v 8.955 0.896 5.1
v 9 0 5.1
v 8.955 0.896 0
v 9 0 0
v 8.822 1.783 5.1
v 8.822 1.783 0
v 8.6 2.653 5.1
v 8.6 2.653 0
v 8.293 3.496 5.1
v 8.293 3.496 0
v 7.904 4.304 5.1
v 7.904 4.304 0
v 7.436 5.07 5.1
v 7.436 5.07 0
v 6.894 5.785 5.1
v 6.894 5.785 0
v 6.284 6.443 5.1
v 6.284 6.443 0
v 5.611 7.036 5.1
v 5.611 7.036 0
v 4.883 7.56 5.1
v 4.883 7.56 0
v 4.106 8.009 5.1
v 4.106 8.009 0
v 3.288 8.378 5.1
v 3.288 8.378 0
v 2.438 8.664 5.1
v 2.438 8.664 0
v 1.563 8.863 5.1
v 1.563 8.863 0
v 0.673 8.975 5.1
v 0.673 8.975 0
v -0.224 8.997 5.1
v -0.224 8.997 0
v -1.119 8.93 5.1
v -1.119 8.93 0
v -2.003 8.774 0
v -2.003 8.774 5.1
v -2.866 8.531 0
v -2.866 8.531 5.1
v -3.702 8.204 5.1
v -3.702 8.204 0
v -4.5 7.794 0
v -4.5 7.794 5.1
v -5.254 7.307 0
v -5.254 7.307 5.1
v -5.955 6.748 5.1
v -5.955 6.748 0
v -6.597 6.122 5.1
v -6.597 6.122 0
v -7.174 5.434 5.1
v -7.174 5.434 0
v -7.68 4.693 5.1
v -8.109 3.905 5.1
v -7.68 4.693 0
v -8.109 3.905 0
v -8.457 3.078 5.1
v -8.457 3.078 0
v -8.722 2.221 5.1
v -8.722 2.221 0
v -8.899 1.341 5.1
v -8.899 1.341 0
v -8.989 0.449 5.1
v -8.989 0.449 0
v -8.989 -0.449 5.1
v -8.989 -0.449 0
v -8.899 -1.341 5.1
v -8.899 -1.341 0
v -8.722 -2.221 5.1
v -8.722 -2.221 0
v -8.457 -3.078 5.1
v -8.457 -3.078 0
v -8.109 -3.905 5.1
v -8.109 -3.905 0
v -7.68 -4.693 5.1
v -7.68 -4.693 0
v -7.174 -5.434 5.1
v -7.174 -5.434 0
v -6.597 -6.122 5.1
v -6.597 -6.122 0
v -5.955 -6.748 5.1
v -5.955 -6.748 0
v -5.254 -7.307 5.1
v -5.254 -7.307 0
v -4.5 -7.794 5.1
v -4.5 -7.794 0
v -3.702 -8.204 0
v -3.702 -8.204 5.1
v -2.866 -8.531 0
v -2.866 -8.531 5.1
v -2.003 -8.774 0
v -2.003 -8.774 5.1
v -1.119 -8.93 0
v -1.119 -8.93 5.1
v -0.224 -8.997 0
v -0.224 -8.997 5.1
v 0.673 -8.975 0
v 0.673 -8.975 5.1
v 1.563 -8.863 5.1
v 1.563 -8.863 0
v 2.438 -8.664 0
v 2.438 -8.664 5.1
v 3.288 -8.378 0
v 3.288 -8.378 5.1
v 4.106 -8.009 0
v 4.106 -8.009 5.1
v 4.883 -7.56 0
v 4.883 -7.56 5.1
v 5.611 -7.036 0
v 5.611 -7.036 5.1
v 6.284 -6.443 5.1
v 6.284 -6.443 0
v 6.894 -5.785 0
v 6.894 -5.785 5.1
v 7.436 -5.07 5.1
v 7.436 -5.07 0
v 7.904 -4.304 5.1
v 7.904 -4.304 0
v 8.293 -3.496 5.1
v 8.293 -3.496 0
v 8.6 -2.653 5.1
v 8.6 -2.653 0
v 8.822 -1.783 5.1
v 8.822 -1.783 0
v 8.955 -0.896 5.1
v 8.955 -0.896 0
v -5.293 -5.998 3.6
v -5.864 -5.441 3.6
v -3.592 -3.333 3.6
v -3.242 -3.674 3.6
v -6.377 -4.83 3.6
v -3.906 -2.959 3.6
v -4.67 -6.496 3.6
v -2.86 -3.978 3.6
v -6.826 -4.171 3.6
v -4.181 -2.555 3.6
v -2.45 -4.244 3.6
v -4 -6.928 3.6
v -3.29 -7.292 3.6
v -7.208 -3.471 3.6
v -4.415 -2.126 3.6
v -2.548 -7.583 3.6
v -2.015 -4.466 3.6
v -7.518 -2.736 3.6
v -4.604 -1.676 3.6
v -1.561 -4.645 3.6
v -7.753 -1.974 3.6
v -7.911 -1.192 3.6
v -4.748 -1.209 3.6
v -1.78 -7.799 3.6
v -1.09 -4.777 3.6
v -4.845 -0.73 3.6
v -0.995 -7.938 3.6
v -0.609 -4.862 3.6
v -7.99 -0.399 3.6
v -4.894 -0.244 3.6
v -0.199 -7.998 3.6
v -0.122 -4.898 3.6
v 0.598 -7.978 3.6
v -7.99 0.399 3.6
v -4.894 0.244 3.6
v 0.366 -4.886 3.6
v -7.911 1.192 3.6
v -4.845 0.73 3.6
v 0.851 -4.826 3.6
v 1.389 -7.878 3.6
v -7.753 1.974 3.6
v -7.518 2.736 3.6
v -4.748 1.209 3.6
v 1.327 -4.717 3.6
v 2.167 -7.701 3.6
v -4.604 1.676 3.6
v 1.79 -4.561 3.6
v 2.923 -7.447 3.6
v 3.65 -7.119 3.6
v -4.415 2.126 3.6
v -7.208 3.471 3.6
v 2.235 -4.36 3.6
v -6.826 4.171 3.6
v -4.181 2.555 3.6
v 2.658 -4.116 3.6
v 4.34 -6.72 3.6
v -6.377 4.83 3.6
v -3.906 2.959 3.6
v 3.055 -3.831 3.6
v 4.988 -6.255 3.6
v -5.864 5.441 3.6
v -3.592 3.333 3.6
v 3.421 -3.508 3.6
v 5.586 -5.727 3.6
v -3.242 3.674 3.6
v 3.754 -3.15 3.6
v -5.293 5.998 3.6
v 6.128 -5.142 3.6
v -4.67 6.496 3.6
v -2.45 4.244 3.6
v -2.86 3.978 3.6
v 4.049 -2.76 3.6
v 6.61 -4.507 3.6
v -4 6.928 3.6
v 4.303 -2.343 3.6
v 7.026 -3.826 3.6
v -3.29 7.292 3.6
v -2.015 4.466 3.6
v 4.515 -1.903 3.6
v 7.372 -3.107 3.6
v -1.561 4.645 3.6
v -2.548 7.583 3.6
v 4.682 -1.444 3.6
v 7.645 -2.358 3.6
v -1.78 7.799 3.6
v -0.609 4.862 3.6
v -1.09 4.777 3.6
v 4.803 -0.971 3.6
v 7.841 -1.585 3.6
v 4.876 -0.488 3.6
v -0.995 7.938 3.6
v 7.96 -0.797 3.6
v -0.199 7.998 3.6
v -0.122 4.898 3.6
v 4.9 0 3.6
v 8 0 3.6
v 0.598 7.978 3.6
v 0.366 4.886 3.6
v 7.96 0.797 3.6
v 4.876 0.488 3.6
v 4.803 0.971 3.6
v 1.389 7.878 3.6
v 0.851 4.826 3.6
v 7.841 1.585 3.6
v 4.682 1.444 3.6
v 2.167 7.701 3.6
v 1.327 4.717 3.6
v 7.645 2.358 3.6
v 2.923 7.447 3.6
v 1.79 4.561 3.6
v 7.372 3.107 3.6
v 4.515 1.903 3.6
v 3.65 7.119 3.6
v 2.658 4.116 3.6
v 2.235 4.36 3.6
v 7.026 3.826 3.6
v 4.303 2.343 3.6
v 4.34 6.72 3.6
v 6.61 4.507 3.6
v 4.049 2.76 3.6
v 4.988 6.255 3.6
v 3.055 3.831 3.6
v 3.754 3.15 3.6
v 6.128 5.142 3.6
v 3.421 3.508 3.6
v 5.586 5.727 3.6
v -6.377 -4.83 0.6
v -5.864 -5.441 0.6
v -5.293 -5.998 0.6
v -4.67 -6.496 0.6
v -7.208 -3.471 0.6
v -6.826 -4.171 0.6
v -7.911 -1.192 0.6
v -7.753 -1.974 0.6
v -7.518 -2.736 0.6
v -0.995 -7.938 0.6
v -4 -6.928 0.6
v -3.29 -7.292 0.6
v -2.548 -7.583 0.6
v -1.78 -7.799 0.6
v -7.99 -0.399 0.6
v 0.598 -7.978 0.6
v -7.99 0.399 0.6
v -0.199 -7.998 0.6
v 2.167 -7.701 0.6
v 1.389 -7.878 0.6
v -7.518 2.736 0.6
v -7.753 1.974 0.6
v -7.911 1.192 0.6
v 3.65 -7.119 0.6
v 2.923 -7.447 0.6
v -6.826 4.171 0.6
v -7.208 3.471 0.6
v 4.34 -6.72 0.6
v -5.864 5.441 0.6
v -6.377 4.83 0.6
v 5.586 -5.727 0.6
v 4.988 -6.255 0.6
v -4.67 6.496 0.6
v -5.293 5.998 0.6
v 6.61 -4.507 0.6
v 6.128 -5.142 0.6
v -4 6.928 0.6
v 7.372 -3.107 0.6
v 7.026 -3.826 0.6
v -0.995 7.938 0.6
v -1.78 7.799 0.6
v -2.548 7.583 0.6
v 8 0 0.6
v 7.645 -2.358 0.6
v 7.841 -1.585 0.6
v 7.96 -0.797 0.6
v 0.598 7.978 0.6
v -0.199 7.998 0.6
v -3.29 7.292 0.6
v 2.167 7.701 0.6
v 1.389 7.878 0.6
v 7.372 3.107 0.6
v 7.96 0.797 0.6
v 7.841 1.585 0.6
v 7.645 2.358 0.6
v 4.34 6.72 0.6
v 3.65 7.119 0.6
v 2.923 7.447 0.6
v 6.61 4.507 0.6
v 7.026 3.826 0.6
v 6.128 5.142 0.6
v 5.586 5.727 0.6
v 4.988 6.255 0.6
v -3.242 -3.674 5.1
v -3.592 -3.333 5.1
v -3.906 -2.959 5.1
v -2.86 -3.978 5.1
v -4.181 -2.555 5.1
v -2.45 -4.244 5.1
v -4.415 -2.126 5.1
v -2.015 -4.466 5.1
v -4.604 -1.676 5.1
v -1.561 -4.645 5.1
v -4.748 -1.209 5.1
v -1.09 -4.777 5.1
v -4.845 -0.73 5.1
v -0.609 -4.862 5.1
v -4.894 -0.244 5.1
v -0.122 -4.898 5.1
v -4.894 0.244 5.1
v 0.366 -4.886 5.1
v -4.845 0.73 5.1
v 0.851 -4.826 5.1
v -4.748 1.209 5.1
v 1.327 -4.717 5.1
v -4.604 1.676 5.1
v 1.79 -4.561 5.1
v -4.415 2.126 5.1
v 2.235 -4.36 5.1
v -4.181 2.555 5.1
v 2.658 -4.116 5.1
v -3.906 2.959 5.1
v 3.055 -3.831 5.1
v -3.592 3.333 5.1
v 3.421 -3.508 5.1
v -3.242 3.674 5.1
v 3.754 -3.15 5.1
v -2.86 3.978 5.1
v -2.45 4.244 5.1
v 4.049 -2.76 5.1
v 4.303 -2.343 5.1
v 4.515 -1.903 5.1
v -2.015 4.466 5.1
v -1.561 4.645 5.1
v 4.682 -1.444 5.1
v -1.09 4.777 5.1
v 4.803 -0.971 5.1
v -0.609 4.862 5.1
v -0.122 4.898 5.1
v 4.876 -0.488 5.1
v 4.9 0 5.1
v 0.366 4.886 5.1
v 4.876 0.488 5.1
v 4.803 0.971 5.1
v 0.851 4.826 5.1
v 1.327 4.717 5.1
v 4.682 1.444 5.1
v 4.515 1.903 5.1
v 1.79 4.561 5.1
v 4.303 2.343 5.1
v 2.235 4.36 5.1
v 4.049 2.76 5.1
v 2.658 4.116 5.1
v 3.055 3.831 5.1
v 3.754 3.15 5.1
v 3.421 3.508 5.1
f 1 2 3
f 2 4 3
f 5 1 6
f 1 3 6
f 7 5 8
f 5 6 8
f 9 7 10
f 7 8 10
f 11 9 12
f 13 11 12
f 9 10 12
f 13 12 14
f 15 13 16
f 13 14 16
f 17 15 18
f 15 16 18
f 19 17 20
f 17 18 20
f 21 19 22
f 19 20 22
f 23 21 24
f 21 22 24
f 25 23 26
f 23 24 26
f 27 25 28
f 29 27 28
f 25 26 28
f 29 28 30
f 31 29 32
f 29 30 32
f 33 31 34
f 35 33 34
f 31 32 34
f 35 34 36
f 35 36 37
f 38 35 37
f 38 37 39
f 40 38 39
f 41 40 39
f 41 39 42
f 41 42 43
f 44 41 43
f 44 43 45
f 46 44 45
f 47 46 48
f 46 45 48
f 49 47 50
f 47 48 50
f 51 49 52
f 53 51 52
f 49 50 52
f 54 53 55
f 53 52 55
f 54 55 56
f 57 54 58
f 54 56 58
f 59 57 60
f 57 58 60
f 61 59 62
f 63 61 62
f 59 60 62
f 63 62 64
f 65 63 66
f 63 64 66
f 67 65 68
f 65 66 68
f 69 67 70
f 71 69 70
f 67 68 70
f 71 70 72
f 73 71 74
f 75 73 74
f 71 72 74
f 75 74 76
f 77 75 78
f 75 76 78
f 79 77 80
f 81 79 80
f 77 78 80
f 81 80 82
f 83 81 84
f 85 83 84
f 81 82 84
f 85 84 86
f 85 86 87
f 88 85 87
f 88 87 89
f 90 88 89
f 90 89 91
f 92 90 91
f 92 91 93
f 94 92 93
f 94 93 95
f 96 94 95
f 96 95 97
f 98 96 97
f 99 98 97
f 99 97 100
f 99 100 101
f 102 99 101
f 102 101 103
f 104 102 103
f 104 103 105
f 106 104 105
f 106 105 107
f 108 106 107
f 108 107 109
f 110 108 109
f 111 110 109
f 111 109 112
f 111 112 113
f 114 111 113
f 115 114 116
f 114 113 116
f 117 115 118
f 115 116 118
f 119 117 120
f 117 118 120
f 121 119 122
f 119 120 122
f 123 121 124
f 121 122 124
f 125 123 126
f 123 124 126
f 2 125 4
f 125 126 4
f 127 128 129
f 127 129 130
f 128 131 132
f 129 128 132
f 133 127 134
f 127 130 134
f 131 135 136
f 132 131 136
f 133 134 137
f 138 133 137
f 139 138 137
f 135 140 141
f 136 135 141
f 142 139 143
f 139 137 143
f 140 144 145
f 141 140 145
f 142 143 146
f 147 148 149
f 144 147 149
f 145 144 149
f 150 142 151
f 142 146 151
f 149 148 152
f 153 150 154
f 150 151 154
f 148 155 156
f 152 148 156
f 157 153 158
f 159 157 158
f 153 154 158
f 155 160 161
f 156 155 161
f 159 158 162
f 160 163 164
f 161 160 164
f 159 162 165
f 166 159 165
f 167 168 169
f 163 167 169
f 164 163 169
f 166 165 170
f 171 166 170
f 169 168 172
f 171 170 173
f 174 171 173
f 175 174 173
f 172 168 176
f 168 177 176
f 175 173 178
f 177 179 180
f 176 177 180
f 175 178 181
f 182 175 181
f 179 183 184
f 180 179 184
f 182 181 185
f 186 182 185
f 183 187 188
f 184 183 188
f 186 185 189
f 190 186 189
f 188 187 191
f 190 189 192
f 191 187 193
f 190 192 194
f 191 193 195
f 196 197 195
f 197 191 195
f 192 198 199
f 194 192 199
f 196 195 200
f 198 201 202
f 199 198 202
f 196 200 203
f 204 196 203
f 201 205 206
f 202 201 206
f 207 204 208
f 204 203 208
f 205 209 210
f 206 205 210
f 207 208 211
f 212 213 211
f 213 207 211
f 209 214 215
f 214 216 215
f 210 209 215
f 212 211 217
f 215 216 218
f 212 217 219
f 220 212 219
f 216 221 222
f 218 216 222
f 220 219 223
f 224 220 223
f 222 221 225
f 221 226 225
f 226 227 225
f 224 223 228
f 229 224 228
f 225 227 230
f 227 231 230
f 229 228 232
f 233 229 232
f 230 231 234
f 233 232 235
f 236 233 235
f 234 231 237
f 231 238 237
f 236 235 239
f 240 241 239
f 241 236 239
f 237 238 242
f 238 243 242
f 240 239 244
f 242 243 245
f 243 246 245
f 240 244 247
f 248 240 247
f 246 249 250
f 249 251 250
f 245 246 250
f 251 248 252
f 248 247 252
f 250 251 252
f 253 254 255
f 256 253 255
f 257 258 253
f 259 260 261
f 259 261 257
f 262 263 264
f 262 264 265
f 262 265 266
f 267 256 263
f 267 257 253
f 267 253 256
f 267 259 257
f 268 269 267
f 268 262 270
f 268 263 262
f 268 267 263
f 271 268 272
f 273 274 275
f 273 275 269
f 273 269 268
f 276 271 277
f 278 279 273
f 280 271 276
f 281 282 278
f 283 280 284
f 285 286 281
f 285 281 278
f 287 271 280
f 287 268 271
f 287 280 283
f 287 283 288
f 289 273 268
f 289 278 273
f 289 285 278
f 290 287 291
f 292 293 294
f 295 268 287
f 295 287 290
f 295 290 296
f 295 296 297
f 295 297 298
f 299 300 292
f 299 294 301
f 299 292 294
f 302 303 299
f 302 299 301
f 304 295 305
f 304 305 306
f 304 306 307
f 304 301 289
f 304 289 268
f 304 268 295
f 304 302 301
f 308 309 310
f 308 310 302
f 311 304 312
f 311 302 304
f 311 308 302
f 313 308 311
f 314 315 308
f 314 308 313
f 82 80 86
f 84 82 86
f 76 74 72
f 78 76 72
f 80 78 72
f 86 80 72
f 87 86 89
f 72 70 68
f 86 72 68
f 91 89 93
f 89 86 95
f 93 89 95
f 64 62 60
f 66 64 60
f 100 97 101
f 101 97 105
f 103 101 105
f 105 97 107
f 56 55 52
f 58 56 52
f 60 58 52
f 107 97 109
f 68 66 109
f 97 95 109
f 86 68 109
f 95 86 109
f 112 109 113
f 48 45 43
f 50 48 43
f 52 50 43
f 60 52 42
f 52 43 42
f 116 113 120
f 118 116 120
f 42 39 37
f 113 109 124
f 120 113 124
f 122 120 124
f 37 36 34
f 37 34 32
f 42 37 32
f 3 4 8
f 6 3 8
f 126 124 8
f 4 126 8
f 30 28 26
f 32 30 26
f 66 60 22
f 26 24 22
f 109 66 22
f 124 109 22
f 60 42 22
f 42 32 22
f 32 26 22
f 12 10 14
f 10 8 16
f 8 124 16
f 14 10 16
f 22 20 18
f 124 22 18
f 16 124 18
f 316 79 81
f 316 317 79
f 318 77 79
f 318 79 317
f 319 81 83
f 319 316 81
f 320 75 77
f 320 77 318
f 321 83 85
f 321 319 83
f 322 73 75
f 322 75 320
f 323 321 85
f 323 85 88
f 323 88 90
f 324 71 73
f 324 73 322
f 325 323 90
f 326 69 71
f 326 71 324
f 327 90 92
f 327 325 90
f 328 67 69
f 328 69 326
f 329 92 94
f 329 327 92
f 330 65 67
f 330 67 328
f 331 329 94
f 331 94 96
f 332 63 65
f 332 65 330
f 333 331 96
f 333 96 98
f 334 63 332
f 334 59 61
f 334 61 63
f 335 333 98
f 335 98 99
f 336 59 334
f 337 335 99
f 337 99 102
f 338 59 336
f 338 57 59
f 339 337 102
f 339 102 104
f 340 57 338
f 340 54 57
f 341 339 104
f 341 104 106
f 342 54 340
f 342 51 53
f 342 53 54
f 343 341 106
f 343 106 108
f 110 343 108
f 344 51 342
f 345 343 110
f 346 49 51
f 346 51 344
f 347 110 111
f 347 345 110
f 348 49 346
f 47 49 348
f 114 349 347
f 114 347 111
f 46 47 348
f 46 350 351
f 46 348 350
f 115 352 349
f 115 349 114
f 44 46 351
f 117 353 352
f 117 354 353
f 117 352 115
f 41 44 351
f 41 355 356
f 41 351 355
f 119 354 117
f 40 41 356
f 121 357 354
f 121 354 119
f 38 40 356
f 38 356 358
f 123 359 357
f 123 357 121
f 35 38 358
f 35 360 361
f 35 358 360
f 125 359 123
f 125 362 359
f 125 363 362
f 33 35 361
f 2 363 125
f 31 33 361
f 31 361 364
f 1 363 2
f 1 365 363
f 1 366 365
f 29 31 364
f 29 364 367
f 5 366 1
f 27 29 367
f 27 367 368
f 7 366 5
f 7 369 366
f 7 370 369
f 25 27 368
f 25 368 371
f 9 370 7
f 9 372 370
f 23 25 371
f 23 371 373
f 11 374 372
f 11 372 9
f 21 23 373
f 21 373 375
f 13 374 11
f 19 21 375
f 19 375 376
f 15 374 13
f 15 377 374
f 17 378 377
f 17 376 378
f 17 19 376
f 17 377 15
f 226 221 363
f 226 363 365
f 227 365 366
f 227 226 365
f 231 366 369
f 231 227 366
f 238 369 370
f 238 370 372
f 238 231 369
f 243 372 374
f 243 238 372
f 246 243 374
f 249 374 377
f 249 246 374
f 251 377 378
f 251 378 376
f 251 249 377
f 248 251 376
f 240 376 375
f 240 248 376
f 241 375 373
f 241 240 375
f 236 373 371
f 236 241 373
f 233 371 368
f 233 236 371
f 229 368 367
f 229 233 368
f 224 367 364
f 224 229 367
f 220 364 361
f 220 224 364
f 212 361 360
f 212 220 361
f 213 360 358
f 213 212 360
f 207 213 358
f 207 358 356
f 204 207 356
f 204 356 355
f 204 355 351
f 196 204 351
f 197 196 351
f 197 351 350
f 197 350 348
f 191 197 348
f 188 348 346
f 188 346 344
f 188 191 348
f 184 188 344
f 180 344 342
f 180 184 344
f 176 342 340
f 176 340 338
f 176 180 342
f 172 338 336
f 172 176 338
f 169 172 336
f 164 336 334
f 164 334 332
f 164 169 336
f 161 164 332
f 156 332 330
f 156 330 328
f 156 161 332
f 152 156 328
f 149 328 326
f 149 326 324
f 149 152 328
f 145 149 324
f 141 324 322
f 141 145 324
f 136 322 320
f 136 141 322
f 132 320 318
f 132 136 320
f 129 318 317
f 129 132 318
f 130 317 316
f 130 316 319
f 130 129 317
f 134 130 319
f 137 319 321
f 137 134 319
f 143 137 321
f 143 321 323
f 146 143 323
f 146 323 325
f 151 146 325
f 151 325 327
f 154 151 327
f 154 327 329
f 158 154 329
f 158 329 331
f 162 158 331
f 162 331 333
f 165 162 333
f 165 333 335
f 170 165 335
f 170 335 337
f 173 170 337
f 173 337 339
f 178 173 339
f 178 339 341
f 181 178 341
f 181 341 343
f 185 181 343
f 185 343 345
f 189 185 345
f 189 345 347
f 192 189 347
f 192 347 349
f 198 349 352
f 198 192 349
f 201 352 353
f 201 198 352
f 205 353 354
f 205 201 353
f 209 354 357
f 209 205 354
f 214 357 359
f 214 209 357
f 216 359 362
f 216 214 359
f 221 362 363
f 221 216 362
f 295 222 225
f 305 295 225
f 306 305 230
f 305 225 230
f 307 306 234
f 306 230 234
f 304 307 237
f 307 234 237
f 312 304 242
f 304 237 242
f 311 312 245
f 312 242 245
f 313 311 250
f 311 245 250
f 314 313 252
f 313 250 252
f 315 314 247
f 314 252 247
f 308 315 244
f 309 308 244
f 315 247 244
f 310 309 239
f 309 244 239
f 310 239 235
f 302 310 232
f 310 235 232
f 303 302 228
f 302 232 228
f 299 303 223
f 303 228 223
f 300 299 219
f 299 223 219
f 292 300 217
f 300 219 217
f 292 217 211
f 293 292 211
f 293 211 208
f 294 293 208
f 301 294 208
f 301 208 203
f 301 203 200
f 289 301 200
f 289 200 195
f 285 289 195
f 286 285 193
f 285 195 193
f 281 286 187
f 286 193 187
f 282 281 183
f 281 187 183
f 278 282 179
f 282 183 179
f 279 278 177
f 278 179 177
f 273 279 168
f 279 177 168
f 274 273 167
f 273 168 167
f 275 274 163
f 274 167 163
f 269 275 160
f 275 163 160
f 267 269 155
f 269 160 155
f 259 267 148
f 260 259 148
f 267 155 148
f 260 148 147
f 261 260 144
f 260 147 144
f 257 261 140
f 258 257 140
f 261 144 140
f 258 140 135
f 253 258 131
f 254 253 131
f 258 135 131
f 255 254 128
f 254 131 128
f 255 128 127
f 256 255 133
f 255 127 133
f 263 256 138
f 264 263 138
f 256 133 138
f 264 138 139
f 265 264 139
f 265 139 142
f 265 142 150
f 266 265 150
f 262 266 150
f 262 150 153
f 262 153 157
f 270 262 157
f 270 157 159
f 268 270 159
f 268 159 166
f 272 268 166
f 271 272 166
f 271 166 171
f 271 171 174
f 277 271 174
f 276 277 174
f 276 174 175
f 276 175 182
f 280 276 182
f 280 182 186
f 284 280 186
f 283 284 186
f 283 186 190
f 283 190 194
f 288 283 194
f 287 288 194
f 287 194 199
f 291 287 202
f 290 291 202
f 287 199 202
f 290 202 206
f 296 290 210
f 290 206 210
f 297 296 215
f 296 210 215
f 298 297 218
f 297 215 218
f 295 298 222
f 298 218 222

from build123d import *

# Parameters (mm, degrees)
F0_R     = 9
F1_DEPTH = 3.6
F2_R     = 8
F3_DEPTH = 3
F4_R     = 9
F4_R_2   = 4.9
F5_DEPTH = 1.5


with BuildPart() as f1:
    # F0 (on Top) → F1 (new body)
    with BuildSketch(Plane.XY):
        Circle(F0_R)
    extrude(amount=F1_DEPTH)

    # F2 (on face) → F3 (cut)
    with BuildSketch(Plane.XY.offset(3.6)):
        Circle(F2_R)
    extrude(amount=-F3_DEPTH, mode=Mode.SUBTRACT)

    # F4 (on face) → F5 (join)
    with BuildSketch(Plane.XY.offset(3.6)):
        Circle(F4_R)
        Circle(F4_R_2, mode=Mode.SUBTRACT)
    extrude(amount=F5_DEPTH)


solid = f1.part
